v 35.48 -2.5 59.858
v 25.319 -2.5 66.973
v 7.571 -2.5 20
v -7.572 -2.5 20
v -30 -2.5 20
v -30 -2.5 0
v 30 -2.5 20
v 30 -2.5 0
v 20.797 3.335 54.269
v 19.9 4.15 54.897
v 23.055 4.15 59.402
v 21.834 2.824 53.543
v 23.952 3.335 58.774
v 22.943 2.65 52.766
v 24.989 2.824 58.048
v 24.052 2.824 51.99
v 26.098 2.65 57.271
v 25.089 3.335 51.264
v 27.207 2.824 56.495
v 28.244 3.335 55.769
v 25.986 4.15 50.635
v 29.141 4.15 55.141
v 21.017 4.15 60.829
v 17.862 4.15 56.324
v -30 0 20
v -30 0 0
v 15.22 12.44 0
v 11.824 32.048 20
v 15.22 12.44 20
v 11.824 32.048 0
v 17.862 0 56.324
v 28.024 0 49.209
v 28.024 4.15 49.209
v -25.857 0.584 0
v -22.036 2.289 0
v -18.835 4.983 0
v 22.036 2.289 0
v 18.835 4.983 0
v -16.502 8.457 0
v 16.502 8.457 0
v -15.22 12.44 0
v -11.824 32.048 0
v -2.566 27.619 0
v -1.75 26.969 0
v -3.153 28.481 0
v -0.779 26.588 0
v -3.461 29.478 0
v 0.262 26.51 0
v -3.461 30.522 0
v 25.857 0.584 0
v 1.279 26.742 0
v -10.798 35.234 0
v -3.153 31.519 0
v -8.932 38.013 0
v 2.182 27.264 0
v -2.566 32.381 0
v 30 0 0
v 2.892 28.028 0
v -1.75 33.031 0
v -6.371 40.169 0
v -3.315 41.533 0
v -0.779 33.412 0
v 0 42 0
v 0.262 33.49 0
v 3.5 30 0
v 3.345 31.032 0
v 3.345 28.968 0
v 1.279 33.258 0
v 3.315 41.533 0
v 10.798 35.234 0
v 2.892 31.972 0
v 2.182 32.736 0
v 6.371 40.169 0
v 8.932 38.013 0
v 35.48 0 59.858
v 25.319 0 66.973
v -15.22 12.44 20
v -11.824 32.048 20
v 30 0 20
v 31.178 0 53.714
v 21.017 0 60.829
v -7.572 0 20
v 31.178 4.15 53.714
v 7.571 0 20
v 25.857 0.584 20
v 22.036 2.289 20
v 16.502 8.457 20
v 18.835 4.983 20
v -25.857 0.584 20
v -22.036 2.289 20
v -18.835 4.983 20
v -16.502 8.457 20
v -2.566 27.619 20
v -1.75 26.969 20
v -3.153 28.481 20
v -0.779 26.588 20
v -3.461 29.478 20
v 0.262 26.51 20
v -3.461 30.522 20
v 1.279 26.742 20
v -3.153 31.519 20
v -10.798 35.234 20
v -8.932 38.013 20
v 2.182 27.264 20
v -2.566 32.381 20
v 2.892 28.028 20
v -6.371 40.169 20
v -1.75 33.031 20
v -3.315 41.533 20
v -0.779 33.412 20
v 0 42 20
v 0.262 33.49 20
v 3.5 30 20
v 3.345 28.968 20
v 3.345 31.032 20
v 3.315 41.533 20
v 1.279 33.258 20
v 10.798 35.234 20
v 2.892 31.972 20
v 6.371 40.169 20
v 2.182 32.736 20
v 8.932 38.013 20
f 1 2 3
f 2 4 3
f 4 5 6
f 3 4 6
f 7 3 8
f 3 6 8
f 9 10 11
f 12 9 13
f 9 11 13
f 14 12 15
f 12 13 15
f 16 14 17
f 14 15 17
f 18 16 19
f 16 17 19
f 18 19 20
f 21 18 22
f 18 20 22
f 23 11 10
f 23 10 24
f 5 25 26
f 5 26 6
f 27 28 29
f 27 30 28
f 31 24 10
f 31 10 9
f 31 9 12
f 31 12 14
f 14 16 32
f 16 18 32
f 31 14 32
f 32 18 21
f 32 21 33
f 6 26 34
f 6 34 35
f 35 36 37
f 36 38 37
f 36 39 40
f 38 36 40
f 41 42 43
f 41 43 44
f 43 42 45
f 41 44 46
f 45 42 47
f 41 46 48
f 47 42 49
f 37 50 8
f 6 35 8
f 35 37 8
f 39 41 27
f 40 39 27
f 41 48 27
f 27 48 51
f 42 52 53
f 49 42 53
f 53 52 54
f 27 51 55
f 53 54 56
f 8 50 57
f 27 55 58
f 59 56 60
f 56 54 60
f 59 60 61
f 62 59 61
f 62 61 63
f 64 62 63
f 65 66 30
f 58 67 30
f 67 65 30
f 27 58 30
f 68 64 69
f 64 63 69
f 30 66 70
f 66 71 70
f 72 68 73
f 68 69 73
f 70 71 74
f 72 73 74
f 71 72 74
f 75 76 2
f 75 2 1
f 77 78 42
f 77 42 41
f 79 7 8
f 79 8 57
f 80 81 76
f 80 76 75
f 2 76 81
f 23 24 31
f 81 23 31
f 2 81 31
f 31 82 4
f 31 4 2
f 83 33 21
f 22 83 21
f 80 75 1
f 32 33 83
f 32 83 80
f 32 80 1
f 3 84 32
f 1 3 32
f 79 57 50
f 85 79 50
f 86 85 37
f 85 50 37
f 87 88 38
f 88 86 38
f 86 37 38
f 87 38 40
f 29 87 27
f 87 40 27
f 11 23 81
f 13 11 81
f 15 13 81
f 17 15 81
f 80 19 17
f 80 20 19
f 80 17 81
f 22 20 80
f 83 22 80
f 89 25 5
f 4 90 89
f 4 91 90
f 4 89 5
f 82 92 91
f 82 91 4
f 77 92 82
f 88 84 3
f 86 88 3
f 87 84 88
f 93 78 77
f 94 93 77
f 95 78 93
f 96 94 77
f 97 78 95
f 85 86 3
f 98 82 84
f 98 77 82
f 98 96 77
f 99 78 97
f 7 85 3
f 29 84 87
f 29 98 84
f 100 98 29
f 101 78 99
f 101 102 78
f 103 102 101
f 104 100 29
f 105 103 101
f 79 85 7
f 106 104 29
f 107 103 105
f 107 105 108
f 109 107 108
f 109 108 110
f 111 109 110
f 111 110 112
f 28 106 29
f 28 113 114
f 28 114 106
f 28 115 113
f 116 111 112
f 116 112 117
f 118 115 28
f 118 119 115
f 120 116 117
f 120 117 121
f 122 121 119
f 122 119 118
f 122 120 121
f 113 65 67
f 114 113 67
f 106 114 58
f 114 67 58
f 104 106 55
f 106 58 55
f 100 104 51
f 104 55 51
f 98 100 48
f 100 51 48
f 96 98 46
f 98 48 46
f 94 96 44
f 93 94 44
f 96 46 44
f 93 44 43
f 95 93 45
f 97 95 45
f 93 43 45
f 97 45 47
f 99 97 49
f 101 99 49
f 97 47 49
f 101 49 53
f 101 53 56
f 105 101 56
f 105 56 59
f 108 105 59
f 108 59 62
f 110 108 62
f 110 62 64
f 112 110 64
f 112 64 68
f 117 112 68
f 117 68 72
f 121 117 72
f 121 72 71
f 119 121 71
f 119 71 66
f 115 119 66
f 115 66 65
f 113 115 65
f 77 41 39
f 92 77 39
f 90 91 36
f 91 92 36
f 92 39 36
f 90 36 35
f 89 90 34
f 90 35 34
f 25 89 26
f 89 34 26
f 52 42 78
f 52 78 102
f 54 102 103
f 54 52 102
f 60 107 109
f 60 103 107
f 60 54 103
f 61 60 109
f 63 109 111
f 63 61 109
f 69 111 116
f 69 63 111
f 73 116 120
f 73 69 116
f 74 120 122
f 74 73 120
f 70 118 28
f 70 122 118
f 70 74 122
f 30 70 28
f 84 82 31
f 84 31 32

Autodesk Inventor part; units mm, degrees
ref_plane "YZ Plane" through (0, 0, 0) normal (1, 0, 0) x (0, 1, 0)
ref_plane "XZ Plane" through (0, 0, 0) normal (0, 1, 0) x (-1, 0, 0)
ref_plane "XY Plane" through (0, 0, 0) normal (0, 0, 1) x (1, 0, 0)
sketch "Sketch1" plane through (0, 0, 0) normal (0, 0, 1) x (1, 0, 0)
  circle A0 centre (0, 30) radius 8.45 construction
  circle A1 centre (0, 30) radius 3.5
  arc A2 (-30, 0) -> (-15.2201, 12.4401) centre (-30, 15) ccw
  arc A3 (15.2201, 12.4401) -> (30, 0) centre (30, 15) ccw
  arc A4 (11.824, 32.0479) -> (-11.824, 32.0479) centre (0, 30) ccw
  line L0 (-11.824, 32.0479) -> (-15.2201, 12.4401)
  line L1 (11.824, 32.0479) -> (15.2201, 12.4401)
  line L2 (30, 0) -> (-30, 0)
  line L3 (-30, 0) -> (-30, -2.5)
  line L4 (-30, -2.5) -> (30, -2.5)
  line L5 (30, -2.5) -> (30, 0)
  point P0 (0, 0)
  point P1 (0, 0)
  point P2 (0, 0)
  dimension "d0" = 16.9
  dimension "d1" = 7
  dimension "d2" = 30
  dimension "d3" = 12
  dimension "d4" = 15
  dimension "d5" = 60
  dimension "d6" = 2.5
extrude "Extrusion1" add sketch "Sketch1" along normal blind 20 contours A1 | A2 L0 A4 L1 A3 L2
extrude "Extrusion3" add sketch "Sketch1" along normal blind 20 contours L2 L5 L4 L3
ref_plane "Work Plane1" through (-30, -2.5, 0) normal (0, -1, 0) x (1, 0, 0)
sketch "Sketch2" plane through (-30, -2.5, 0) normal (0, -1, 0) x (1, 0, 0)
  line L0 (21.55, 20) -> (38.45, 20) projected
  line L1 (30, 20) -> (30, 60) construction
  line L2 (60, 0) -> (60, 20) construction
  line L3 (30, 20) -> (52.9431, 52.7661) construction
  line L4 (47.9062, 63.0072) -> (64.2892, 51.5357)
  line L5 (64.2892, 51.5357) -> (61.1346, 47.0303)
  line L6 (61.1346, 47.0303) -> (44.7515, 58.5018) construction
  line L7 (44.7515, 58.5018) -> (47.9062, 63.0072)
  line L8 (44.7515, 58.5018) -> (17.7923, 20)
  line L9 (41.824, 20) -> (18.176, 20) projected
  line L10 (61.1346, 47.0303) -> (42.2077, 20)
  line L11 (0, 20) -> (60, 20) projected
  point P0 (30, 0)
  dimension "d14" = 35
  dimension "d16" = 5.5
  dimension "d17" = 20
  dimension "d26" = 40
extrude "Extrusion6" add sketch "Sketch2" against normal blind 2.5
sketch "Sketch4" plane through (34.2892, -2.5, 51.5357) normal (0.5735764, 0, 0.819152) x (0.819152, 0, -0.5735764)
  line L0 (-23.103, 0) -> (-34.5746, 0) projected
  circle A0 centre (-10, 10.5) radius 7.3 construction
  circle A1 centre (-10, 10.5) radius 5.35
  line L1 (-16.2022, 2.5) -> (-3.7978, 2.5)
  line L2 (-3.7978, 2.5) -> (-3.7978, 6.65)
  line L3 (-3.7978, 6.65) -> (-16.2022, 6.65)
  line L4 (-16.2022, 6.65) -> (-16.2022, 2.5)
  line L5 (-20, 2.5) -> (0, 2.5) projected
  line L6 (-16.2022, 2.5) -> (-16.2022, 0)
  line L7 (-3.7978, 2.5) -> (-3.7978, 0)
  line L8 (-23.103, 0) -> (26.0461, 0) projected
  line L9 (0, 0) -> (-20, 0) projected
  line L10 (0, 0) -> (0, 2.5) projected
  line L11 (-20, 2.5) -> (0, 2.5) projected
  line L12 (-20, 0) -> (-20, 2.5) projected
  point P0 (1.4715, 2.5)
  point P1 (-10, 2.5)
  point P2 (-6.2852, 6.65)
  point P3 (-13.7148, 6.65)
  point P4 (0, 0)
  point P5 (0, 2.5)
  point P6 (-20, 2.5)
  point P7 (-20, 0)
  point P8 (-16.2022, 2.5)
  dimension "d29" = 14.6
  dimension "d30" = 10.7
  dimension "d31" = 1.5
  dimension "d32" = 8
extrude "Extrusion7" add sketch "Sketch4" against normal blind 5.5 contours A1 L3 L2 L1 L4
extrude "Extrusion8" cut sketch "Sketch4" against normal up to surface contours L6 L8 L12 L5 | L5 L10 L8 L7 surface through (0, 21, 20) normal (0, 0, 1)
extrude "Extrusion9" add sketch "Sketch4" along normal blind 7.5 contours L1 L7 L8 L6
extrude "Extrusion10" cut sketch "Sketch1" along normal through all contours A1
properties part number "Support 2 - V1"
